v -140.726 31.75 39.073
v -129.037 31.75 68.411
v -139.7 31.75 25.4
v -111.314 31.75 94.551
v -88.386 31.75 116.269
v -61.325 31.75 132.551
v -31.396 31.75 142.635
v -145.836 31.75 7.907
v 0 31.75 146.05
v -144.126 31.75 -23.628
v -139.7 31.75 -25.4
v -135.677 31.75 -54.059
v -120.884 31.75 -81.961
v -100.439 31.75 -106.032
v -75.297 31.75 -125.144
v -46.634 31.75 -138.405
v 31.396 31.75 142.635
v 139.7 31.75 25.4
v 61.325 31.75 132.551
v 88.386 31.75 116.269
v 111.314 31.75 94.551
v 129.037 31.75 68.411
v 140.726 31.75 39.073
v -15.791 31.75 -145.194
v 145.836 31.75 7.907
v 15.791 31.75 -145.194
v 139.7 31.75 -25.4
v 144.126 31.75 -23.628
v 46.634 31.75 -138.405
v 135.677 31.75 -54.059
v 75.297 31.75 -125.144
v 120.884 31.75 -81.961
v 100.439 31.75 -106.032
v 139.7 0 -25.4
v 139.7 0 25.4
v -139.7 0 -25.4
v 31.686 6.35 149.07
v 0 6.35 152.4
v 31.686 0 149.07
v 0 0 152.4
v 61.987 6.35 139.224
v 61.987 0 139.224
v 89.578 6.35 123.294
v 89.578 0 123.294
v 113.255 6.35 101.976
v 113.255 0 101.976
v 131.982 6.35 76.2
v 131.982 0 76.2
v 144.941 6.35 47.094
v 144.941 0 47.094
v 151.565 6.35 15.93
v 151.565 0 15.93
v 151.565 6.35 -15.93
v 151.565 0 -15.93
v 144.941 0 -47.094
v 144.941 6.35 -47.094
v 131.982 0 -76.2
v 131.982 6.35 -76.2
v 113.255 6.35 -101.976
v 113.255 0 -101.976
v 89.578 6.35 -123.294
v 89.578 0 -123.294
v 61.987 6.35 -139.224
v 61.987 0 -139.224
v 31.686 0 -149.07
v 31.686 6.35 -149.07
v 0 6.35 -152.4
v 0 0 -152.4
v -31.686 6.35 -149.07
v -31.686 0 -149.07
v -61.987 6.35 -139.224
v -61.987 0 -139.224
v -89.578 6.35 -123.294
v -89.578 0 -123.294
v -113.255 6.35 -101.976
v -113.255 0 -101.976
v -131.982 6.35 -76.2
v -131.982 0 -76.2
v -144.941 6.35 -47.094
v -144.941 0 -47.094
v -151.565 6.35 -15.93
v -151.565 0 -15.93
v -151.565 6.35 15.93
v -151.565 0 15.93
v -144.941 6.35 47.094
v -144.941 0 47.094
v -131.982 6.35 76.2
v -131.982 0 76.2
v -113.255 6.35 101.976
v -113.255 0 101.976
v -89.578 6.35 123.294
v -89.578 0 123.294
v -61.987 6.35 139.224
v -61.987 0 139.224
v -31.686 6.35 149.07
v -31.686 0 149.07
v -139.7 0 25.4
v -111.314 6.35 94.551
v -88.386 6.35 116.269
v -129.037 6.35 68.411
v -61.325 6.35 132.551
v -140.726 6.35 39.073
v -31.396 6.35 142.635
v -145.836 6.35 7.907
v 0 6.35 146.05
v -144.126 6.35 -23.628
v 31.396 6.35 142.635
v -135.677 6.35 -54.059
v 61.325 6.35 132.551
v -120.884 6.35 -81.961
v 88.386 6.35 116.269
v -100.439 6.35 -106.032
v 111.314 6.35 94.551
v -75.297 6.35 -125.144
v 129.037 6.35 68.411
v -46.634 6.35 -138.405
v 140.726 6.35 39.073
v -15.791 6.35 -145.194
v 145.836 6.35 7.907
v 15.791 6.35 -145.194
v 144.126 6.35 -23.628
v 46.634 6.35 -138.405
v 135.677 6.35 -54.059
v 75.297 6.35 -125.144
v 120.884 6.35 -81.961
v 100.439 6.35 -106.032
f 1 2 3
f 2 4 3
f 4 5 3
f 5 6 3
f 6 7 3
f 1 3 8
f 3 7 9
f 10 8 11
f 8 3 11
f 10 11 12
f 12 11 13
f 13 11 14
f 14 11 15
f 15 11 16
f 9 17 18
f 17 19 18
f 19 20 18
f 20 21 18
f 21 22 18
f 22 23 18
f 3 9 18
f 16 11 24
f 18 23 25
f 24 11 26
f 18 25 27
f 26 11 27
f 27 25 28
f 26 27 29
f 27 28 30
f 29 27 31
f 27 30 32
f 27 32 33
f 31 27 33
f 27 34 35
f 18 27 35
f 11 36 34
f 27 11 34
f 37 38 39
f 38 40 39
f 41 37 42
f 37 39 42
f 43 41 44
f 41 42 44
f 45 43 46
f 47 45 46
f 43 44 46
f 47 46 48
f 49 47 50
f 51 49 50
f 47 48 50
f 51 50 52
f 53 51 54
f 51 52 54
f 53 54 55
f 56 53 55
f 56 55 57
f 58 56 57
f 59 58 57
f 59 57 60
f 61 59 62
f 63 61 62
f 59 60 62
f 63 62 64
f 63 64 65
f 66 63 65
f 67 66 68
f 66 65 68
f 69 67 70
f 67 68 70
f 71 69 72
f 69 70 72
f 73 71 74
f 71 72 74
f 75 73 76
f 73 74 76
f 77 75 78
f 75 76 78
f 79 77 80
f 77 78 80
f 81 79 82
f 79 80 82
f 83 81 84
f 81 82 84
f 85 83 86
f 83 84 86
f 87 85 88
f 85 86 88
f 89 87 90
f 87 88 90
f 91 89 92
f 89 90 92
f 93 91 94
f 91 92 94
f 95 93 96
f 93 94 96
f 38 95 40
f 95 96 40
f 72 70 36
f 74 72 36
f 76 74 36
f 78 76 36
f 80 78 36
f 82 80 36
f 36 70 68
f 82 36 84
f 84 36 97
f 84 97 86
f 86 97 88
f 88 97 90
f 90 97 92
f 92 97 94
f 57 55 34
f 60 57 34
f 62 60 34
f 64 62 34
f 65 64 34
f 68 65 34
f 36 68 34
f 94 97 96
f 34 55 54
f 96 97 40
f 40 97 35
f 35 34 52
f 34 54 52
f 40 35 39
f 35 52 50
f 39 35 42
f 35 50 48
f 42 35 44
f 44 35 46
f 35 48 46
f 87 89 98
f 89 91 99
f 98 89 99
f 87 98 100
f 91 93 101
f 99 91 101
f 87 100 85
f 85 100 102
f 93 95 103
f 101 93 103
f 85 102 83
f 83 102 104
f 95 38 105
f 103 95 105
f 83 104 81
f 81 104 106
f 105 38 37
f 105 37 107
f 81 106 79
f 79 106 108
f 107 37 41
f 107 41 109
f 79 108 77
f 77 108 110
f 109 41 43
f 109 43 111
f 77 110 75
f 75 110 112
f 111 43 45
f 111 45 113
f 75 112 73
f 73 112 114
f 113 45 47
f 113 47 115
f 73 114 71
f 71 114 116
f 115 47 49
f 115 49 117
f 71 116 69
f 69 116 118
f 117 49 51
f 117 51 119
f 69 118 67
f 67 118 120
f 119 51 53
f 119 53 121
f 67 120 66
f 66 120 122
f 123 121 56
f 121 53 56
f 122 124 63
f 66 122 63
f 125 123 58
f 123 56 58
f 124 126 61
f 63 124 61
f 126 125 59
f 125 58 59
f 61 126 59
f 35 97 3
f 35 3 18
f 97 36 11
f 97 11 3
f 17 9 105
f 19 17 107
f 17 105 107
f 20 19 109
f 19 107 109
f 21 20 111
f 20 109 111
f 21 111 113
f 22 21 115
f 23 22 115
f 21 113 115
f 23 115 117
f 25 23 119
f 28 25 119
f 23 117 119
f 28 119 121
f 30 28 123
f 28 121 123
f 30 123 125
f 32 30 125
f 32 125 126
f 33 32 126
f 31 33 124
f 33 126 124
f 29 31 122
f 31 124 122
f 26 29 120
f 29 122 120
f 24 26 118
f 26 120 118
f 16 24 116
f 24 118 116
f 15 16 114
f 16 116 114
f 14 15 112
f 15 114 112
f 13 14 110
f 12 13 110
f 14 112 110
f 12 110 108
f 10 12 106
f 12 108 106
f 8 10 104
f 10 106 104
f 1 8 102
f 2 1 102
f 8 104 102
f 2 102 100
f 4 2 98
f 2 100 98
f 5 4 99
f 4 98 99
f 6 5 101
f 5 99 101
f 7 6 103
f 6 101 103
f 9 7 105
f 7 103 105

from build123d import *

# Parameters (mm, degrees)
F2_W     = 279.4
F2_H     = 50.8
F3_DEPTH = 31.751


with BuildPart() as f1:
    # F0 (on Right) → F1 (revolve)
    with BuildSketch(Plane.YZ):
        Polygon((0, 152.4), (0, 0), (31.75, 0), (31.75, 146.05), (6.35, 146.05), (6.35, 152.4), align=None)
    revolve(axis=Axis((0, 59.051867, 0), (0, 1, 0)))

    # F2 (on face) → F3 (cut, through all)
    with BuildSketch(Plane.XZ):
        Rectangle(F2_W, F2_H)
    extrude(amount=-F3_DEPTH, mode=Mode.SUBTRACT)


solid = f1.part
